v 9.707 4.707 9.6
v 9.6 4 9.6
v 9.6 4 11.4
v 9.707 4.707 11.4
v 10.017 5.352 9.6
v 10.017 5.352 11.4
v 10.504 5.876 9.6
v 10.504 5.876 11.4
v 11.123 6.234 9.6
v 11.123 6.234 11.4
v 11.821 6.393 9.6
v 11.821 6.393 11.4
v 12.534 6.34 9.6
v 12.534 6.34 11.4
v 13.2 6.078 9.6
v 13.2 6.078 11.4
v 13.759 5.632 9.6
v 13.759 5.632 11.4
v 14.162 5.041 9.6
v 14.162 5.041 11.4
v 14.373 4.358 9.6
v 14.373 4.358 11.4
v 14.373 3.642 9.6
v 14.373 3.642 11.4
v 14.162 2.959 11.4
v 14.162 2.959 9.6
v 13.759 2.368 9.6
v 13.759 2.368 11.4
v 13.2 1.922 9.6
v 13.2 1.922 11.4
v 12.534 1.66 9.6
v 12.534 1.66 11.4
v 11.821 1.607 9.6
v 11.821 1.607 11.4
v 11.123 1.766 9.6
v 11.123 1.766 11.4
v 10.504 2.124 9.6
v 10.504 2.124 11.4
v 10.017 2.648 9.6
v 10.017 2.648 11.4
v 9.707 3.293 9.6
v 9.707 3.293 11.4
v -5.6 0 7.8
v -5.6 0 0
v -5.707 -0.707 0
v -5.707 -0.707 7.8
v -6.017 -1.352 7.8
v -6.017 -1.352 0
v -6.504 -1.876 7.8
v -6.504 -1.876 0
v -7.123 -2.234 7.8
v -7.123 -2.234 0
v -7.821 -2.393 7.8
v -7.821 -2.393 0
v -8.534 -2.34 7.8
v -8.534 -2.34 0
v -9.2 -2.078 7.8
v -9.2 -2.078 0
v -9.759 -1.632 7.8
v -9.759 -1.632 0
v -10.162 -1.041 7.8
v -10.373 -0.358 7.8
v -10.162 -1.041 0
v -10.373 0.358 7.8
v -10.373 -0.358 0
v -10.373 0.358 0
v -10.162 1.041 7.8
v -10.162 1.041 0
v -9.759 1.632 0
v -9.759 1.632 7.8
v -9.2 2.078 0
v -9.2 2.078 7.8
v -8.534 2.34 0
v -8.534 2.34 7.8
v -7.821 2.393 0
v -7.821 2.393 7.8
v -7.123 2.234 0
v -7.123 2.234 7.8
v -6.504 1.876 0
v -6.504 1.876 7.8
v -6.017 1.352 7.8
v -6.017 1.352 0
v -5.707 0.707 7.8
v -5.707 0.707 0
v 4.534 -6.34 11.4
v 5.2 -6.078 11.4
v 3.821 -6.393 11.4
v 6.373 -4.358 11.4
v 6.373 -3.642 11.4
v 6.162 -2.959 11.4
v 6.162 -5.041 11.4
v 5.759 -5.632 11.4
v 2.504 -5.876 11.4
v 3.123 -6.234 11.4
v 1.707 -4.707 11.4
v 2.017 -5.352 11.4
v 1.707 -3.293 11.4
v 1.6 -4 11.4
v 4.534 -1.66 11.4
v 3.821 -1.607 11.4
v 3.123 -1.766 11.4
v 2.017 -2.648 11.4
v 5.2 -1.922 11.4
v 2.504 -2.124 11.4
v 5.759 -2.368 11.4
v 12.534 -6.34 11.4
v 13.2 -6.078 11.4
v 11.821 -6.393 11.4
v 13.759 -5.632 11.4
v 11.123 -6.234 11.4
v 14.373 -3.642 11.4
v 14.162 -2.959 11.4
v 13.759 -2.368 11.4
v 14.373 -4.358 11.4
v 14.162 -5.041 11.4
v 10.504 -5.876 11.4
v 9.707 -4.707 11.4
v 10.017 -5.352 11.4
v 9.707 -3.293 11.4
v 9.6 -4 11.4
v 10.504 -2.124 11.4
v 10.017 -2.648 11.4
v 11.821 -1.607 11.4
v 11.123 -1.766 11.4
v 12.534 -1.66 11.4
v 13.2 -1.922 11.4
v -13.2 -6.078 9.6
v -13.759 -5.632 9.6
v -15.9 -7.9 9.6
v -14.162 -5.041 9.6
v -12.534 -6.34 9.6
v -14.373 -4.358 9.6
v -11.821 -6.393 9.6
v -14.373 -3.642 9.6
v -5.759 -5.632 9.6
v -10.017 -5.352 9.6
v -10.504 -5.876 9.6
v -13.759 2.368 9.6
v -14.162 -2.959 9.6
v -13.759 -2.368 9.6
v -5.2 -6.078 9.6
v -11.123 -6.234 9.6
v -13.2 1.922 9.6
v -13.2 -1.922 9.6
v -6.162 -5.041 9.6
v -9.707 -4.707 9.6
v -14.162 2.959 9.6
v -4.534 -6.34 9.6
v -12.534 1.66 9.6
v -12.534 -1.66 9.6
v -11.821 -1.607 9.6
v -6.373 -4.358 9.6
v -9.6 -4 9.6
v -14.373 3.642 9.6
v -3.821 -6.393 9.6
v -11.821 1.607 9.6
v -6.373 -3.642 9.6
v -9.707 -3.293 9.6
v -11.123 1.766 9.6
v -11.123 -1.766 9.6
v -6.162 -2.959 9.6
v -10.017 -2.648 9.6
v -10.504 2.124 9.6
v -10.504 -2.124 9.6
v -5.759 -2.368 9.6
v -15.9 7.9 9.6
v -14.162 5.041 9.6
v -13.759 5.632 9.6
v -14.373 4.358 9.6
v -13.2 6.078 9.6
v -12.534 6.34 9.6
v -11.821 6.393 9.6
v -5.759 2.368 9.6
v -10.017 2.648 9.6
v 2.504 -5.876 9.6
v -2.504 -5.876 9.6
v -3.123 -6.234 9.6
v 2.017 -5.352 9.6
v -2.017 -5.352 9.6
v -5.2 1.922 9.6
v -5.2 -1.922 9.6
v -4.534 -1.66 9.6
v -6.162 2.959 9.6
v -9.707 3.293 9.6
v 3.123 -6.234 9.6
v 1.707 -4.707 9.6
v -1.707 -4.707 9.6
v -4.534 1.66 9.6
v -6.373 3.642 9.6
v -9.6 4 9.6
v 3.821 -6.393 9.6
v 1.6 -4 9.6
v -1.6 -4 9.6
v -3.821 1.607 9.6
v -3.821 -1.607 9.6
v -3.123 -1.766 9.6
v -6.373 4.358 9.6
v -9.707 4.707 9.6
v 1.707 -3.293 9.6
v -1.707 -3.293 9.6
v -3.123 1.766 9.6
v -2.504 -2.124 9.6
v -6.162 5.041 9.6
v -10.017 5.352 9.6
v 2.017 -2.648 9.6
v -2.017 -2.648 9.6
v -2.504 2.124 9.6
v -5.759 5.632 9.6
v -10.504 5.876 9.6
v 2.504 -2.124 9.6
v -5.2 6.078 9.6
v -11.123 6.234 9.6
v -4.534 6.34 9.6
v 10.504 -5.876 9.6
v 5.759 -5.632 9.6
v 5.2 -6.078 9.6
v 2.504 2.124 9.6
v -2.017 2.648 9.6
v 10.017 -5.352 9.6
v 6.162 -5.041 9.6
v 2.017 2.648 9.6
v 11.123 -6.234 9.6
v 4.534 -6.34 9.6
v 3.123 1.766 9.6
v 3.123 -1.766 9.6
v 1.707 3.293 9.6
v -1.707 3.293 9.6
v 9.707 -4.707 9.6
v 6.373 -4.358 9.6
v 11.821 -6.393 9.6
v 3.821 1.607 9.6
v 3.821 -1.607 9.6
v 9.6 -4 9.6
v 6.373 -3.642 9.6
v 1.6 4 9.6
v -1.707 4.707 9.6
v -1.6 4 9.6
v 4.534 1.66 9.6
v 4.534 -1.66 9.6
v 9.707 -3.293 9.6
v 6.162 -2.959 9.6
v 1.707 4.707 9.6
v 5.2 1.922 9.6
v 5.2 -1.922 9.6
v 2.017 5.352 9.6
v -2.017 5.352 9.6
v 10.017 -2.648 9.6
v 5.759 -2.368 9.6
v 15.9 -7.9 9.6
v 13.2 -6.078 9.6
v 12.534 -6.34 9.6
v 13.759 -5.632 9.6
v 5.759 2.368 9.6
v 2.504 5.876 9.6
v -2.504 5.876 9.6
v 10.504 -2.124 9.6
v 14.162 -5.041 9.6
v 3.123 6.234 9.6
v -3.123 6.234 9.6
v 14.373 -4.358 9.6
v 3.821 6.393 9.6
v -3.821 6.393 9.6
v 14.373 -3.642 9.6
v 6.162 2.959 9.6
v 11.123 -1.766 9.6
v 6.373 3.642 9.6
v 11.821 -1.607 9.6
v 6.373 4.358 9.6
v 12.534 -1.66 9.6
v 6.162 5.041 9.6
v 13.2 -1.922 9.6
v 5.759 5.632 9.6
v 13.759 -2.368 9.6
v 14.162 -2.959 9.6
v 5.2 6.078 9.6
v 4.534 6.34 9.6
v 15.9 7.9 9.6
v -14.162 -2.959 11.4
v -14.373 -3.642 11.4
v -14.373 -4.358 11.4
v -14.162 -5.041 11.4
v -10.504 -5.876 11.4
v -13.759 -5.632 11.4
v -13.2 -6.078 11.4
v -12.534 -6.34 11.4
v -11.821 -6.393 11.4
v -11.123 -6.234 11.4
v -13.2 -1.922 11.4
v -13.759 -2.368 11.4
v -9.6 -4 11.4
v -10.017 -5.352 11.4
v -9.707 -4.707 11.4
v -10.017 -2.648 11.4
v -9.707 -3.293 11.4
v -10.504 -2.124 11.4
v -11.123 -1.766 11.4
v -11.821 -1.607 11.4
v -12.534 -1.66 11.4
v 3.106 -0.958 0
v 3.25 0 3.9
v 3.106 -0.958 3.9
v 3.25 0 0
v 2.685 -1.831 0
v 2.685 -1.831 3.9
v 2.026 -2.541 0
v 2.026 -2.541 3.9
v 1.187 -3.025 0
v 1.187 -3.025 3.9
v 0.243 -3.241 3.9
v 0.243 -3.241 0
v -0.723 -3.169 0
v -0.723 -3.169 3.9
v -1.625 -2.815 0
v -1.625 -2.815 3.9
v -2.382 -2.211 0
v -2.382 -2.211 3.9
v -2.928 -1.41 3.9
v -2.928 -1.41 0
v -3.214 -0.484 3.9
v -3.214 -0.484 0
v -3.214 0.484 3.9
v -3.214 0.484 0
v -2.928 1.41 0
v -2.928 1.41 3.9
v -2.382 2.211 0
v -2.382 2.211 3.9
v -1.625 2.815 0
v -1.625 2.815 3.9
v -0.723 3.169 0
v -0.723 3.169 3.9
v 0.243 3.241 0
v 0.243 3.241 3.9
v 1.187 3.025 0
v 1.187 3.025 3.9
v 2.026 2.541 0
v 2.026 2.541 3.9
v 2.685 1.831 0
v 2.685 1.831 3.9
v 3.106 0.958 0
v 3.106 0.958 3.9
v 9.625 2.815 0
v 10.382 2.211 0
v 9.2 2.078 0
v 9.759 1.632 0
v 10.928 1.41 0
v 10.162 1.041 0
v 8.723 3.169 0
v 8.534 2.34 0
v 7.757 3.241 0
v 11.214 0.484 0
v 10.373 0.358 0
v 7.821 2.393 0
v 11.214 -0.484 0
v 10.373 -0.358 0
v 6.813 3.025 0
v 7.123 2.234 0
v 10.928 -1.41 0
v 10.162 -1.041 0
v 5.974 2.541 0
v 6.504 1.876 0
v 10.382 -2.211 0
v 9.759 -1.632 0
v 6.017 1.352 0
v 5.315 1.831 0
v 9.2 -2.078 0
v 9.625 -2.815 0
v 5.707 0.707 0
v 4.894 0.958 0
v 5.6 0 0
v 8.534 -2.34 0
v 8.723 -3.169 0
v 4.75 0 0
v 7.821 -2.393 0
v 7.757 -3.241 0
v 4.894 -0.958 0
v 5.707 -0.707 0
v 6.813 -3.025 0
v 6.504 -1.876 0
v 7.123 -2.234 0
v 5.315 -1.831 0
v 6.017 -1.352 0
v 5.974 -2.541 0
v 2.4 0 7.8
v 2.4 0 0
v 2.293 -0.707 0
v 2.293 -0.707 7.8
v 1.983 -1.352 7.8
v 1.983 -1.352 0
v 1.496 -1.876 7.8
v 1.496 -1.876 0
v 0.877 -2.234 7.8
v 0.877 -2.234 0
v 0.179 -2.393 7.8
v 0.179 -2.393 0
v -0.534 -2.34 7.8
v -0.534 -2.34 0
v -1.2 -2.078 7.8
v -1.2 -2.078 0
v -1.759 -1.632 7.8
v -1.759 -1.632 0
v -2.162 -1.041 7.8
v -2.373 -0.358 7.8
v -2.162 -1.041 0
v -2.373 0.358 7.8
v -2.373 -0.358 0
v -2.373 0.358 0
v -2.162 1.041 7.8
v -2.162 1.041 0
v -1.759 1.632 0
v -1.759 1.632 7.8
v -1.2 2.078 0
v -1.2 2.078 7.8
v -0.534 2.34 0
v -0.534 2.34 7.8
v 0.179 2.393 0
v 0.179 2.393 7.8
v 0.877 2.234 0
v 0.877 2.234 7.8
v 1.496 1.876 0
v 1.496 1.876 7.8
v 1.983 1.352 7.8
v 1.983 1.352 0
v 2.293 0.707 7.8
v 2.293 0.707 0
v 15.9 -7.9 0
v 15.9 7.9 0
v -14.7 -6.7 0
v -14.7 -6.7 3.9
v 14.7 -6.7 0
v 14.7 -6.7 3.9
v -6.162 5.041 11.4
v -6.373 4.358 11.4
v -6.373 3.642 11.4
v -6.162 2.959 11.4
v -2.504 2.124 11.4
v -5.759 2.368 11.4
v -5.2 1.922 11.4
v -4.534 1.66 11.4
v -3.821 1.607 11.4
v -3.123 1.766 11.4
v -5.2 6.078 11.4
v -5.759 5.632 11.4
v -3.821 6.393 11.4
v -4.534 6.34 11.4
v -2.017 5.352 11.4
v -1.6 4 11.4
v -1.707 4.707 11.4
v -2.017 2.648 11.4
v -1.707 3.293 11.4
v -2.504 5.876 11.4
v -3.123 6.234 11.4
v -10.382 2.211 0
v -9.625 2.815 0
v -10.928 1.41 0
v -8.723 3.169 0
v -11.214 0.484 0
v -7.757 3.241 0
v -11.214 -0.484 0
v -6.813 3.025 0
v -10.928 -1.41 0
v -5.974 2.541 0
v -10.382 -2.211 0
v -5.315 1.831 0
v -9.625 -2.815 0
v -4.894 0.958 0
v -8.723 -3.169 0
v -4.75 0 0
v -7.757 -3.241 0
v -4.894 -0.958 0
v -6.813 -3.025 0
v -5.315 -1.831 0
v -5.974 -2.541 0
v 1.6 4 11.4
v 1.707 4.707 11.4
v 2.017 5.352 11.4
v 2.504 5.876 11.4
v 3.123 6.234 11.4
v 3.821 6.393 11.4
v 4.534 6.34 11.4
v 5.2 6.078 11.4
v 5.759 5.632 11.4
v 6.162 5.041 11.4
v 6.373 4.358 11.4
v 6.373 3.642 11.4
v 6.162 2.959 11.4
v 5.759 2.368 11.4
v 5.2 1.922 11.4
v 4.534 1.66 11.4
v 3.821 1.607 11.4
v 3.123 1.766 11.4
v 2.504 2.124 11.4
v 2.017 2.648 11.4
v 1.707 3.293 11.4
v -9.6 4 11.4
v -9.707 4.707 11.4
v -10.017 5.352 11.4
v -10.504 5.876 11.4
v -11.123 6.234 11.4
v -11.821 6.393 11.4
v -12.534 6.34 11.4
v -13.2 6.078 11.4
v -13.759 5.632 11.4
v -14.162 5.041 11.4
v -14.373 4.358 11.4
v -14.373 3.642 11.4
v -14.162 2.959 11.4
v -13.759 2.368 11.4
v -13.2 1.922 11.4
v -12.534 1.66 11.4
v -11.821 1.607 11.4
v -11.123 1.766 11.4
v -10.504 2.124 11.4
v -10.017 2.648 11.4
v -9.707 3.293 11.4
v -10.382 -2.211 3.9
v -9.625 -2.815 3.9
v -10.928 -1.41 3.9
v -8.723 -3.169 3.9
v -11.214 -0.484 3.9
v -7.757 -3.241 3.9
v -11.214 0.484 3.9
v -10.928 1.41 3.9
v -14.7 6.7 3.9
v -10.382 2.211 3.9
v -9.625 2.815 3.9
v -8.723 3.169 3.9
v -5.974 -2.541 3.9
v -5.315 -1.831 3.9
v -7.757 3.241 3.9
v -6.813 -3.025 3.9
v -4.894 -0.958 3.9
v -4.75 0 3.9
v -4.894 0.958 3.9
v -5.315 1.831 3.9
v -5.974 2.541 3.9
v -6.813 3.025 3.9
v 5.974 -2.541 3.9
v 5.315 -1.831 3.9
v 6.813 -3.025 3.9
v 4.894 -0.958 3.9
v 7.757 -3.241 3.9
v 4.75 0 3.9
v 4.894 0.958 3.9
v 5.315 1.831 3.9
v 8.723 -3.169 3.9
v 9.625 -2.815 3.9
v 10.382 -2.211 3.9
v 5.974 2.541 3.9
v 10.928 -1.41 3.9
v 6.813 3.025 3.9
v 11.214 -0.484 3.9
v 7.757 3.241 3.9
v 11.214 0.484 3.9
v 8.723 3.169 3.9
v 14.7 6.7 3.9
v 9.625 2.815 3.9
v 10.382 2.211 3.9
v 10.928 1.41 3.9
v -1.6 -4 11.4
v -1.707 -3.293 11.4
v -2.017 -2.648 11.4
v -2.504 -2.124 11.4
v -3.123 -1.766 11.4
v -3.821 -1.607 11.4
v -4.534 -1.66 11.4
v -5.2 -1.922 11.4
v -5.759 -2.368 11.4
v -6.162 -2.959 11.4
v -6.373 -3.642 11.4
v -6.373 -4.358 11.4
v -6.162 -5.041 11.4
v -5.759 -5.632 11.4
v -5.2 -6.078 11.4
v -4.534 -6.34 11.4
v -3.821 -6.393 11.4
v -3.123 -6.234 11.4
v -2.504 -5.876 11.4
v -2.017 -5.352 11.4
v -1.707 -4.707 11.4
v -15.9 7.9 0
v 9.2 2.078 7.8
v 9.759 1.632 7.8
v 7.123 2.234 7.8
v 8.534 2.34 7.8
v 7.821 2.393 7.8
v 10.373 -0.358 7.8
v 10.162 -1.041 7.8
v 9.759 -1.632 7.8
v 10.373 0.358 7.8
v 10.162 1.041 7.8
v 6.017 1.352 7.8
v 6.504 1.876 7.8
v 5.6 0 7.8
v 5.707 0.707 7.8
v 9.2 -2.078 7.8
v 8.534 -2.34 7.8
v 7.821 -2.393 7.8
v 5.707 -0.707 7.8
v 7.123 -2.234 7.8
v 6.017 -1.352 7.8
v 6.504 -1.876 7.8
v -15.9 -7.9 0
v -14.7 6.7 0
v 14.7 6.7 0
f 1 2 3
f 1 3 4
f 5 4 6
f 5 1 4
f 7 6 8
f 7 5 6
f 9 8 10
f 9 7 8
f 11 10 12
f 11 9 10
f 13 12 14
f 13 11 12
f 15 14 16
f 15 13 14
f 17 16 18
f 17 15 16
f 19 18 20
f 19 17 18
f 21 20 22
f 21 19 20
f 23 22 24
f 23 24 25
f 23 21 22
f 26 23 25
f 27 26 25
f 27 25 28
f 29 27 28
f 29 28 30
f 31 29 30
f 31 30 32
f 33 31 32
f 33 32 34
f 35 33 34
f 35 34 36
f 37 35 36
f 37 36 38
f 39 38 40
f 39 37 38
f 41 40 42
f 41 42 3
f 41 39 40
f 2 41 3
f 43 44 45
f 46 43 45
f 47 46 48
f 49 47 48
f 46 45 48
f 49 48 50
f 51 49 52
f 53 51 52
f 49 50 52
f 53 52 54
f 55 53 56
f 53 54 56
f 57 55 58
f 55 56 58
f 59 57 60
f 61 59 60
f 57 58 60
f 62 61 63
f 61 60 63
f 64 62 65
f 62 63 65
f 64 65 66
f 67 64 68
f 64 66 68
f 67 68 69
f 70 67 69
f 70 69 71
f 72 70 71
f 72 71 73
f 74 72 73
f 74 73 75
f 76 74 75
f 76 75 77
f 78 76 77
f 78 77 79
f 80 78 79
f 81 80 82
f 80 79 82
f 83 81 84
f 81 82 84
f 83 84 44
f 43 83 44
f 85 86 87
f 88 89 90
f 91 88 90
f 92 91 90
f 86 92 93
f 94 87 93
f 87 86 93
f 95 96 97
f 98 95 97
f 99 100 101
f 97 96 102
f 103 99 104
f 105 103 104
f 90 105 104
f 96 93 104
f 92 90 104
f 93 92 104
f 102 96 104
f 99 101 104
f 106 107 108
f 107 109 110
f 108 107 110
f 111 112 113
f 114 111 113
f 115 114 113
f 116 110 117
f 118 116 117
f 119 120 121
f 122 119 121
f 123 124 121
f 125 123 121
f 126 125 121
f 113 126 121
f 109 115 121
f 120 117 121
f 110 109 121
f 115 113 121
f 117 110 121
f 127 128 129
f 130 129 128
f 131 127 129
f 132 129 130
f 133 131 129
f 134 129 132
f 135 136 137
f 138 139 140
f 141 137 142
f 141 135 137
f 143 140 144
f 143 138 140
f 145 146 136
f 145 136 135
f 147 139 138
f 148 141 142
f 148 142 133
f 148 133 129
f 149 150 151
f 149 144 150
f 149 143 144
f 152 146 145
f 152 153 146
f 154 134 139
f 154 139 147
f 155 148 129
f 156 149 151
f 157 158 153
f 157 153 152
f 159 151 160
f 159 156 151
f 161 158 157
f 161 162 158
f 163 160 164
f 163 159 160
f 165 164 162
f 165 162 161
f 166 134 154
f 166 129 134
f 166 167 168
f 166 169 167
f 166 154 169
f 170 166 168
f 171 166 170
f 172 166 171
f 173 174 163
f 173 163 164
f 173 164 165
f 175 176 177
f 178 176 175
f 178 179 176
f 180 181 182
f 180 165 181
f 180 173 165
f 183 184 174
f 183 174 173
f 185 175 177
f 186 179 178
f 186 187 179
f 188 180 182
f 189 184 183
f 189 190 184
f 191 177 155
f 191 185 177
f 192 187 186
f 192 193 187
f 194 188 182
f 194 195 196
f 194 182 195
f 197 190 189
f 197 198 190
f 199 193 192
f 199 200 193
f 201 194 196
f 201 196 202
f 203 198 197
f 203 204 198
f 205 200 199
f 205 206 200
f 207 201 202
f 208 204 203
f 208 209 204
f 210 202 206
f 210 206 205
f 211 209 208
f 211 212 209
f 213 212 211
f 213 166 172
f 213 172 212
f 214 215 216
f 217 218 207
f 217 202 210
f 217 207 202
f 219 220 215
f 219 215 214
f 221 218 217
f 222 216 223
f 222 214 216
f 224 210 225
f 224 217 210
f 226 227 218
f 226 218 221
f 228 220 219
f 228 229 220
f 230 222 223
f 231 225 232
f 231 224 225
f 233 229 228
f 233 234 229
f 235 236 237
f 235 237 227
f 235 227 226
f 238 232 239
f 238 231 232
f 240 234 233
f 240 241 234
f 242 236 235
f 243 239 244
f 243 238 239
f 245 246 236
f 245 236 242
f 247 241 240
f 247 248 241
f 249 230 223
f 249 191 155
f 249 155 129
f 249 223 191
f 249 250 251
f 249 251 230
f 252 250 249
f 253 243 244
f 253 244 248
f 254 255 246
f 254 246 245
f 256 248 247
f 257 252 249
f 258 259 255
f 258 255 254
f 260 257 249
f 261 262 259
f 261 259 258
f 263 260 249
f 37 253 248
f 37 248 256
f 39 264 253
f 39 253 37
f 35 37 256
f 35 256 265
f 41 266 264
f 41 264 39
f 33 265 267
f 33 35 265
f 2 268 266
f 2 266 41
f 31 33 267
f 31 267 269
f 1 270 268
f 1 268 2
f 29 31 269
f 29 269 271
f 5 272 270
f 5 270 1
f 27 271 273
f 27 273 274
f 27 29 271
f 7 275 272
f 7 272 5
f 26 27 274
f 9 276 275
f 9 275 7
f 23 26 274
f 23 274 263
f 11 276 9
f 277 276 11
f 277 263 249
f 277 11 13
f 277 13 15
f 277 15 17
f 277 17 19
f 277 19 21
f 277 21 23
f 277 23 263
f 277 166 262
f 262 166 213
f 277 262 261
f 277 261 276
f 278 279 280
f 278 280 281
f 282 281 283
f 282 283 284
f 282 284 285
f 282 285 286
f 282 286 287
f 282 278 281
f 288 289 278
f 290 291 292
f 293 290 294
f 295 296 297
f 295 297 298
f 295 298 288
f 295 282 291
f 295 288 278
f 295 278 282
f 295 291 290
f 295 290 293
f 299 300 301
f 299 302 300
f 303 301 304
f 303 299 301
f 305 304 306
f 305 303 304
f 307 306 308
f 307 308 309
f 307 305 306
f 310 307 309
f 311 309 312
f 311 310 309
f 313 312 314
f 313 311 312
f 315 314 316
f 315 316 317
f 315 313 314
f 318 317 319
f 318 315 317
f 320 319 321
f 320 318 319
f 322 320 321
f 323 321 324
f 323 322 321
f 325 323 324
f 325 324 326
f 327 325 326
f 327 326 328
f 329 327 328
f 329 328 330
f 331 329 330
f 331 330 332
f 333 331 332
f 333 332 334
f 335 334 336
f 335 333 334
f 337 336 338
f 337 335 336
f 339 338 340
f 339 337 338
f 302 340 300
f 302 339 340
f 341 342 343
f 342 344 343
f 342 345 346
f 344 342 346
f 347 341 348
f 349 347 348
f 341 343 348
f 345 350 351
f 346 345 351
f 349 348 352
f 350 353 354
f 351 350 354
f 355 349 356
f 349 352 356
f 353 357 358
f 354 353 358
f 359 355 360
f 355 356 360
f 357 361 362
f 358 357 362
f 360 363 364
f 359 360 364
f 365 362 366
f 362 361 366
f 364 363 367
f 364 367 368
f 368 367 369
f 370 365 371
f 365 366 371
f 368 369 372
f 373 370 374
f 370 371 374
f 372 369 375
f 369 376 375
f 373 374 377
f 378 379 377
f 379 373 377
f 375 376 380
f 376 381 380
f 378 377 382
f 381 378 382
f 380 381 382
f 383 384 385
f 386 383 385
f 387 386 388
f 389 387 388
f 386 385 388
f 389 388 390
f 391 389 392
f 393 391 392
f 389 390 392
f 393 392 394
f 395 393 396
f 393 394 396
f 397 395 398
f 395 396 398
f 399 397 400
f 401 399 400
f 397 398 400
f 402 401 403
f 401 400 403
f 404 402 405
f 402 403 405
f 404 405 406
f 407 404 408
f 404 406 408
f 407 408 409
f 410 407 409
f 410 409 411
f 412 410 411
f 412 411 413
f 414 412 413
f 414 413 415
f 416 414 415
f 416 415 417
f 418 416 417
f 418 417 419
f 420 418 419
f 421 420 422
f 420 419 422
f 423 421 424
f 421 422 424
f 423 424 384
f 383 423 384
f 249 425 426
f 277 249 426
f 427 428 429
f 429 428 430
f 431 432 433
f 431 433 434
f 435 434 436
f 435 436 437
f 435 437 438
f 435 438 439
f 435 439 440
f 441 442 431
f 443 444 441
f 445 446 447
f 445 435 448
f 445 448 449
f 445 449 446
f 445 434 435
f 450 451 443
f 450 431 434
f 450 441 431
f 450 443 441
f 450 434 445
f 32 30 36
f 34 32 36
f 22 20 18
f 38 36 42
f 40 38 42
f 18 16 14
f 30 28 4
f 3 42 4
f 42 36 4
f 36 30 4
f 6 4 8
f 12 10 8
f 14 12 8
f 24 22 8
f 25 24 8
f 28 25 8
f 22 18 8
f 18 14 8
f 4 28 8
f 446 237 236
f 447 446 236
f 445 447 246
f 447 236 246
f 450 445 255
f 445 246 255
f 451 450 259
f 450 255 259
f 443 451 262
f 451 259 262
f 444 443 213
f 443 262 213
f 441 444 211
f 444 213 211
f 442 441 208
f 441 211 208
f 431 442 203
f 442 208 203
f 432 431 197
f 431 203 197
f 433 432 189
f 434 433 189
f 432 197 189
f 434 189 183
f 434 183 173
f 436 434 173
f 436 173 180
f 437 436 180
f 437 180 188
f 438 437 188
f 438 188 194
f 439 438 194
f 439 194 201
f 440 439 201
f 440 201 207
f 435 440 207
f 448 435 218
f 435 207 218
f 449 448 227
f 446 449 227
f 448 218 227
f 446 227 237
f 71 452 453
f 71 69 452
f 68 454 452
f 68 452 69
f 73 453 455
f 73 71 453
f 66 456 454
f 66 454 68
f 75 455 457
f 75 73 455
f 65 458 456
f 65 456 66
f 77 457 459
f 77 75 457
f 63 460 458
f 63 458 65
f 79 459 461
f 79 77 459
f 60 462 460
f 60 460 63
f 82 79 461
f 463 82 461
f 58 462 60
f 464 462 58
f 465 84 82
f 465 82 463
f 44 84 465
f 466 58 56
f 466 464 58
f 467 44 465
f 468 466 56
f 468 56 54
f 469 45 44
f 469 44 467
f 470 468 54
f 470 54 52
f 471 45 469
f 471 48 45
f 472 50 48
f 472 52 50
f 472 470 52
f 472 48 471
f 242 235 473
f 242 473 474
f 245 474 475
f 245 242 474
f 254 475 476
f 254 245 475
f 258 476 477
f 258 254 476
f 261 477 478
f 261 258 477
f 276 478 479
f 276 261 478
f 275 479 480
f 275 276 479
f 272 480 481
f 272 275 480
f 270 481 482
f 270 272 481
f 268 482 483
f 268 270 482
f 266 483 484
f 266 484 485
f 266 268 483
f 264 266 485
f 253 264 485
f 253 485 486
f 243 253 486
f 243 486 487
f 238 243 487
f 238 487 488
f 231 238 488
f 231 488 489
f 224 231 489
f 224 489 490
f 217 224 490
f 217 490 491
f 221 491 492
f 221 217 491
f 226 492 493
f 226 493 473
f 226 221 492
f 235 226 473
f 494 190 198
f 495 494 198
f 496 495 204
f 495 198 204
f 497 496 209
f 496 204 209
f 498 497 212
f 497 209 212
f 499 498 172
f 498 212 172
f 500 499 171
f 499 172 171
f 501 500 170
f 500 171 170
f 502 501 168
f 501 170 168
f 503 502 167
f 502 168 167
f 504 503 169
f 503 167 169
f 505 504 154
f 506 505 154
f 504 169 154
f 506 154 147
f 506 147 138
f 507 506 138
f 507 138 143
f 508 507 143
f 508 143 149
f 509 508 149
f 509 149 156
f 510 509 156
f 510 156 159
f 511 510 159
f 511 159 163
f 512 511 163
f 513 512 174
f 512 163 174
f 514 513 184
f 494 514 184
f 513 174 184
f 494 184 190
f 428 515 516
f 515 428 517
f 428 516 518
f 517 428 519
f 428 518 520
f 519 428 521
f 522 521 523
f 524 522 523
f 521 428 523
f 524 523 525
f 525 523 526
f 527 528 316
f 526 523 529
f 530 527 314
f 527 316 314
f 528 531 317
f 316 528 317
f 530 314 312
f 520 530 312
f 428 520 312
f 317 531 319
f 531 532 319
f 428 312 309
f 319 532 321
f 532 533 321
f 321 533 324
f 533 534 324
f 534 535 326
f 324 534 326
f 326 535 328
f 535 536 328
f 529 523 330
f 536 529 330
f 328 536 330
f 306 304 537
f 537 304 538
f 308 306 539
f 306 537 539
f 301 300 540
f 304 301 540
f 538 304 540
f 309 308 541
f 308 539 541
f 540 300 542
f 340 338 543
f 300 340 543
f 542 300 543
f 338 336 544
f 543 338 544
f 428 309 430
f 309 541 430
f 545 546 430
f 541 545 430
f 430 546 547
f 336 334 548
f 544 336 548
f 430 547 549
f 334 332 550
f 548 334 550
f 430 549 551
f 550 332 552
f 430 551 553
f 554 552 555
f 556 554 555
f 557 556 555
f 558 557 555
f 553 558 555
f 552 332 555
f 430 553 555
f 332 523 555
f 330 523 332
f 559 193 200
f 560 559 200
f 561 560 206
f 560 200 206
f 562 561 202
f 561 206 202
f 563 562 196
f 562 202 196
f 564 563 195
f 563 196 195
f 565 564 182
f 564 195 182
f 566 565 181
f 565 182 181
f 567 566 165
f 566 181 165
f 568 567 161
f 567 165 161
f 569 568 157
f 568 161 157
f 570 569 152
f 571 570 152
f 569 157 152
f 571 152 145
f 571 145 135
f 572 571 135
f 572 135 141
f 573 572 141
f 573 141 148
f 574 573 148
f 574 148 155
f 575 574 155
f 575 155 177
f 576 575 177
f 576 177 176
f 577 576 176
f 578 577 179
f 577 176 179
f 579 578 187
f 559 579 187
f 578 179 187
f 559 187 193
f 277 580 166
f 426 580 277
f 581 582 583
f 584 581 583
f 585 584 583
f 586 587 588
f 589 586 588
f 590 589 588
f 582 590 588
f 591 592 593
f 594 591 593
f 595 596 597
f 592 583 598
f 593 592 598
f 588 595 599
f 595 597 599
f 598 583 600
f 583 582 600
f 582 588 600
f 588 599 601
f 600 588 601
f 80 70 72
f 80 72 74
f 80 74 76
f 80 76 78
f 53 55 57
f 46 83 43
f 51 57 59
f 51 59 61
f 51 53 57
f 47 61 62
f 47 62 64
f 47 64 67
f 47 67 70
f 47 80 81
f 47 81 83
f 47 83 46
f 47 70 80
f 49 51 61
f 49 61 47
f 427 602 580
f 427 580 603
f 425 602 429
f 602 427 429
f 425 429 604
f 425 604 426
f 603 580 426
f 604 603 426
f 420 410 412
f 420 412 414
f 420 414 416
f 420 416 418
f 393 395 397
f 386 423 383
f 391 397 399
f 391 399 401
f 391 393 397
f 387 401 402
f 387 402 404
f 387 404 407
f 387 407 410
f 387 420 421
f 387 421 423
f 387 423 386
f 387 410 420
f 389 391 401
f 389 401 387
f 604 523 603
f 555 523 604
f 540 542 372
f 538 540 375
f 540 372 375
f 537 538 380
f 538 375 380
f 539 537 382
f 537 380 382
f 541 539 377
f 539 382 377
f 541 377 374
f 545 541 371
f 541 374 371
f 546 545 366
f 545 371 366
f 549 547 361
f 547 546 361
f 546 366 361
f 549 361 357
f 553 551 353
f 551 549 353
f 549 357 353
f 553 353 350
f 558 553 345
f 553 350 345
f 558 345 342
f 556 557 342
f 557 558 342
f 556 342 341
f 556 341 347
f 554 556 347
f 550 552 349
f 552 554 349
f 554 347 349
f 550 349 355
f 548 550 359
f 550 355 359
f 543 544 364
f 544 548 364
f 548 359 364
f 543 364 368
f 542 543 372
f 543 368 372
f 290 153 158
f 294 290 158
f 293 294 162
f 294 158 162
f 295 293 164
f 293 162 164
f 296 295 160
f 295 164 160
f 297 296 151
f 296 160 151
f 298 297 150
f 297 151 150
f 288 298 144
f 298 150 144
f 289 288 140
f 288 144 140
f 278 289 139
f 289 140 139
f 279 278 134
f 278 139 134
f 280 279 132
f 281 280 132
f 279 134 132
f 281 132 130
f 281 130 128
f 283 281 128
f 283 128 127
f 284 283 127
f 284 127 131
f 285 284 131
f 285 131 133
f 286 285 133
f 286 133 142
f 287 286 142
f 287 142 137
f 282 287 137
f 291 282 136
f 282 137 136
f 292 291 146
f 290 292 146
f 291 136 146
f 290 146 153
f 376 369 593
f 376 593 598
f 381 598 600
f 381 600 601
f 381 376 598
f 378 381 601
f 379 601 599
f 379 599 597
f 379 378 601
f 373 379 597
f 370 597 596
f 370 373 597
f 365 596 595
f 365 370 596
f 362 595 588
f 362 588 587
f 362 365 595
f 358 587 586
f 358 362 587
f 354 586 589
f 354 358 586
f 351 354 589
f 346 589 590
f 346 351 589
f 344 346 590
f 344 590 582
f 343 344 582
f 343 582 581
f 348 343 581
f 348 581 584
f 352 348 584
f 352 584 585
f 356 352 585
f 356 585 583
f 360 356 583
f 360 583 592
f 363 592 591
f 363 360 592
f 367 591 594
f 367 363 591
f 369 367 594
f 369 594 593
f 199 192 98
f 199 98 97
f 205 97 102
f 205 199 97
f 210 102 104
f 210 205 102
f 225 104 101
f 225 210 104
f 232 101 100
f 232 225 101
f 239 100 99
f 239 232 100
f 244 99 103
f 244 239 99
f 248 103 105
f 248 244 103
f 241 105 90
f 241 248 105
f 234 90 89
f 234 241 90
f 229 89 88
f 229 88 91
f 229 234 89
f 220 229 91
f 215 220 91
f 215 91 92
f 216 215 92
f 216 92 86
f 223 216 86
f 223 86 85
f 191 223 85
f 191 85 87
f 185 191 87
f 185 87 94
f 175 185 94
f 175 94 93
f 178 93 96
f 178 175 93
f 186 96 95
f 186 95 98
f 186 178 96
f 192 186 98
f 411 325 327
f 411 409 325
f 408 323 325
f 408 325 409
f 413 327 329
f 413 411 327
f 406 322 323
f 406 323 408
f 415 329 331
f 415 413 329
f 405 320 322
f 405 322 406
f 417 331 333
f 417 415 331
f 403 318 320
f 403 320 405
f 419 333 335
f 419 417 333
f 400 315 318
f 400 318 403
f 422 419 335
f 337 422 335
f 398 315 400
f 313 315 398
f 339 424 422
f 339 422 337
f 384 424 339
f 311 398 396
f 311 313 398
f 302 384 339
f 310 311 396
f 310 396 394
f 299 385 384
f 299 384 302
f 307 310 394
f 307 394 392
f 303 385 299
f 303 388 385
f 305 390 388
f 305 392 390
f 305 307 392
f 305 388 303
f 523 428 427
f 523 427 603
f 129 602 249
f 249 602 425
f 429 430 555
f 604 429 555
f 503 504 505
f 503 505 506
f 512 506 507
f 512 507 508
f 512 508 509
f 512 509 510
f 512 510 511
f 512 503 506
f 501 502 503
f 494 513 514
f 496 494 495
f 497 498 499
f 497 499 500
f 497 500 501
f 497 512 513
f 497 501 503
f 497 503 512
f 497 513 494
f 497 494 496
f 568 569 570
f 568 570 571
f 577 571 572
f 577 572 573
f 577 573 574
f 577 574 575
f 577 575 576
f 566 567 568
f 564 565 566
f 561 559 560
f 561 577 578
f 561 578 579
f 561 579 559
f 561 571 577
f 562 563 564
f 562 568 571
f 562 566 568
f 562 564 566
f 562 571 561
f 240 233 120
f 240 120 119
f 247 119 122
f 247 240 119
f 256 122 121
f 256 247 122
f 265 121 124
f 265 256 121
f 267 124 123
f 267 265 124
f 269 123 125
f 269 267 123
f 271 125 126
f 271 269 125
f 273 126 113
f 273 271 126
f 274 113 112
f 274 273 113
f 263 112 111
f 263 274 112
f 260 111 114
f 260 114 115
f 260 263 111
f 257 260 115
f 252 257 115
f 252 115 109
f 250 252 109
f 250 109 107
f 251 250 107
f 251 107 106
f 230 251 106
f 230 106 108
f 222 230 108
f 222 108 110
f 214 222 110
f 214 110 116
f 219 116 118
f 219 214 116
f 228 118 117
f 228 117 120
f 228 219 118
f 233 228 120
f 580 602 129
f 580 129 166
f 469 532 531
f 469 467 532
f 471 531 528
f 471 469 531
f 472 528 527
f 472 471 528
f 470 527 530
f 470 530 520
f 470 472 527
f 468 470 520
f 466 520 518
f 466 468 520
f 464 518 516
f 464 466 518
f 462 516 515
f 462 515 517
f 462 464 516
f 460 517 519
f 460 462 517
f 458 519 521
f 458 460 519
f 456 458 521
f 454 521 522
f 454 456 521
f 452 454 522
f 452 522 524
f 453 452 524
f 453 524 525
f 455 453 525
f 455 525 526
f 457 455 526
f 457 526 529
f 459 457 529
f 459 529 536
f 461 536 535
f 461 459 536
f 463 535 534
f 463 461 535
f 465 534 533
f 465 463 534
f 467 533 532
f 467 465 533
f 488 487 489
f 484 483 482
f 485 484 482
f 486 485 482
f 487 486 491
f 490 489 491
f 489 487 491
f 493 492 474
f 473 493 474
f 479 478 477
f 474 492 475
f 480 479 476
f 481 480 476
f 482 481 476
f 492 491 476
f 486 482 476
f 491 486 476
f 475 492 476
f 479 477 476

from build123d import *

# Parameters (mm, degrees)
SKETCH_W        = 31.8
SKETCH_H        = 15.8
PAD_DEPTH       = 9.6
SKETCH001_W     = 29.4
SKETCH001_H     = 13.4
POCKET_DEPTH    = 3.9
SKETCH002_R     = 2.4
PAD001_DEPTH    = 1.8
SKETCH003_R     = 2.4
PAD002_DEPTH    = 1.8
SKETCH004_R     = 2.4
PAD003_DEPTH    = 1.8
SKETCH005_R     = 2.4
PAD004_DEPTH    = 1.8
SKETCH006_R     = 3.25
PAD005_DEPTH    = 3.9
SKETCH007_R     = 2.4
POCKET001_DEPTH = 7.8
SKETCH008_R     = 3.25
PAD006_DEPTH    = 3.9
SKETCH009_R     = 2.4
POCKET002_DEPTH = 7.8


with BuildPart() as part:
    # Sketch → Pad (new body)
    with BuildSketch(Plane.XY):
        Rectangle(SKETCH_W, SKETCH_H)
    extrude(amount=PAD_DEPTH)

    # Sketch001 → Pocket (cut, symmetric)
    with BuildSketch(Plane.XY):
        Rectangle(SKETCH001_W, SKETCH001_H)
    extrude(amount=POCKET_DEPTH, both=True, mode=Mode.SUBTRACT)

    # Sketch002 (on Face5 of Pocket) → Pad001 (join)
    with BuildSketch(Plane.XY.offset(9.6)):
        with Locations((-12, 4)):
            Circle(SKETCH002_R)
    pad001 = extrude(amount=PAD001_DEPTH)

    # Sketch003 (on Face5 of Pad001) → Pad002 (join)
    with BuildSketch(Plane.XY.offset(9.6)):
        with Locations((-4, 4)):
            Circle(SKETCH003_R)
    pad002 = extrude(amount=PAD002_DEPTH)

    # Sketch004 (on Face5 of Pad002) → Pad003 (join)
    with BuildSketch(Plane.XY.offset(9.6)):
        with Locations((-12, -4)):
            Circle(SKETCH004_R)
    pad003 = extrude(amount=PAD003_DEPTH)

    # Sketch005 (on Face5 of Pad003) → Pad004 (join)
    with BuildSketch(Plane.XY.offset(9.6)):
        with Locations((-4, -4)):
            Circle(SKETCH005_R)
    pad004 = extrude(amount=PAD004_DEPTH)

    # Mirrored: Pad001, Pad002, Pad003, Pad004 across Sketch002 V_Axis
    add(pad001.mirror(Plane(origin=(0, 0, 9.6), x_dir=(0, 0, 1), z_dir=(1, 0, 0))))
    add(pad002.mirror(Plane(origin=(0, 0, 9.6), x_dir=(0, 0, 1), z_dir=(1, 0, 0))))
    add(pad003.mirror(Plane(origin=(0, 0, 9.6), x_dir=(0, 0, 1), z_dir=(1, 0, 0))))
    add(pad004.mirror(Plane(origin=(0, 0, 9.6), x_dir=(0, 0, 1), z_dir=(1, 0, 0))))

    # Sketch006 (on Face19 of Mirrored) → Pad005 (join, symmetric)
    with BuildSketch(Plane(origin=(0, 0, 3.9), x_dir=(1, 0, 0), z_dir=(0, 0, -1))):
        Circle(SKETCH006_R)
    extrude(amount=PAD005_DEPTH, both=True)

    # Sketch007 (on Face29 of Pad005) → Pocket001 (cut)
    with BuildSketch(Plane(origin=(0, 0, 0), x_dir=(1, 0, 0), z_dir=(0, 0, -1))):
        Circle(SKETCH007_R)
    extrude(amount=-POCKET001_DEPTH, mode=Mode.SUBTRACT)

    # Sketch008 (on Face19 of Pocket001) → Pad006 (join, symmetric)
    with BuildSketch(Plane(origin=(0, 0, 3.9), x_dir=(1, 0, 0), z_dir=(0, 0, -1))):
        with Locations((-8, 0)):
            Circle(SKETCH008_R)
    pad006 = extrude(amount=PAD006_DEPTH, both=True)

    # Sketch009 (on Face30 of Pad006) → Pocket002 (cut)
    with BuildSketch(Plane(origin=(0, 0, 0), x_dir=(1, 0, 0), z_dir=(0, 0, -1))):
        with Locations((-8, 0)):
            Circle(SKETCH009_R)
    pocket002 = extrude(amount=-POCKET002_DEPTH, mode=Mode.SUBTRACT)

    # Mirrored001: Pad006 across Sketch008 V_Axis
    add(pad006.mirror(Plane(origin=(0, 0, 3.9), x_dir=(0, 0, -1), z_dir=(1, 0, 0))))

    # Mirrored002: Pocket002 across Sketch009 V_Axis
    add(pocket002.mirror(Plane(origin=(0, 0, 0), x_dir=(0, 0, -1), z_dir=(1, 0, 0))), mode=Mode.SUBTRACT)


solid = part.part
